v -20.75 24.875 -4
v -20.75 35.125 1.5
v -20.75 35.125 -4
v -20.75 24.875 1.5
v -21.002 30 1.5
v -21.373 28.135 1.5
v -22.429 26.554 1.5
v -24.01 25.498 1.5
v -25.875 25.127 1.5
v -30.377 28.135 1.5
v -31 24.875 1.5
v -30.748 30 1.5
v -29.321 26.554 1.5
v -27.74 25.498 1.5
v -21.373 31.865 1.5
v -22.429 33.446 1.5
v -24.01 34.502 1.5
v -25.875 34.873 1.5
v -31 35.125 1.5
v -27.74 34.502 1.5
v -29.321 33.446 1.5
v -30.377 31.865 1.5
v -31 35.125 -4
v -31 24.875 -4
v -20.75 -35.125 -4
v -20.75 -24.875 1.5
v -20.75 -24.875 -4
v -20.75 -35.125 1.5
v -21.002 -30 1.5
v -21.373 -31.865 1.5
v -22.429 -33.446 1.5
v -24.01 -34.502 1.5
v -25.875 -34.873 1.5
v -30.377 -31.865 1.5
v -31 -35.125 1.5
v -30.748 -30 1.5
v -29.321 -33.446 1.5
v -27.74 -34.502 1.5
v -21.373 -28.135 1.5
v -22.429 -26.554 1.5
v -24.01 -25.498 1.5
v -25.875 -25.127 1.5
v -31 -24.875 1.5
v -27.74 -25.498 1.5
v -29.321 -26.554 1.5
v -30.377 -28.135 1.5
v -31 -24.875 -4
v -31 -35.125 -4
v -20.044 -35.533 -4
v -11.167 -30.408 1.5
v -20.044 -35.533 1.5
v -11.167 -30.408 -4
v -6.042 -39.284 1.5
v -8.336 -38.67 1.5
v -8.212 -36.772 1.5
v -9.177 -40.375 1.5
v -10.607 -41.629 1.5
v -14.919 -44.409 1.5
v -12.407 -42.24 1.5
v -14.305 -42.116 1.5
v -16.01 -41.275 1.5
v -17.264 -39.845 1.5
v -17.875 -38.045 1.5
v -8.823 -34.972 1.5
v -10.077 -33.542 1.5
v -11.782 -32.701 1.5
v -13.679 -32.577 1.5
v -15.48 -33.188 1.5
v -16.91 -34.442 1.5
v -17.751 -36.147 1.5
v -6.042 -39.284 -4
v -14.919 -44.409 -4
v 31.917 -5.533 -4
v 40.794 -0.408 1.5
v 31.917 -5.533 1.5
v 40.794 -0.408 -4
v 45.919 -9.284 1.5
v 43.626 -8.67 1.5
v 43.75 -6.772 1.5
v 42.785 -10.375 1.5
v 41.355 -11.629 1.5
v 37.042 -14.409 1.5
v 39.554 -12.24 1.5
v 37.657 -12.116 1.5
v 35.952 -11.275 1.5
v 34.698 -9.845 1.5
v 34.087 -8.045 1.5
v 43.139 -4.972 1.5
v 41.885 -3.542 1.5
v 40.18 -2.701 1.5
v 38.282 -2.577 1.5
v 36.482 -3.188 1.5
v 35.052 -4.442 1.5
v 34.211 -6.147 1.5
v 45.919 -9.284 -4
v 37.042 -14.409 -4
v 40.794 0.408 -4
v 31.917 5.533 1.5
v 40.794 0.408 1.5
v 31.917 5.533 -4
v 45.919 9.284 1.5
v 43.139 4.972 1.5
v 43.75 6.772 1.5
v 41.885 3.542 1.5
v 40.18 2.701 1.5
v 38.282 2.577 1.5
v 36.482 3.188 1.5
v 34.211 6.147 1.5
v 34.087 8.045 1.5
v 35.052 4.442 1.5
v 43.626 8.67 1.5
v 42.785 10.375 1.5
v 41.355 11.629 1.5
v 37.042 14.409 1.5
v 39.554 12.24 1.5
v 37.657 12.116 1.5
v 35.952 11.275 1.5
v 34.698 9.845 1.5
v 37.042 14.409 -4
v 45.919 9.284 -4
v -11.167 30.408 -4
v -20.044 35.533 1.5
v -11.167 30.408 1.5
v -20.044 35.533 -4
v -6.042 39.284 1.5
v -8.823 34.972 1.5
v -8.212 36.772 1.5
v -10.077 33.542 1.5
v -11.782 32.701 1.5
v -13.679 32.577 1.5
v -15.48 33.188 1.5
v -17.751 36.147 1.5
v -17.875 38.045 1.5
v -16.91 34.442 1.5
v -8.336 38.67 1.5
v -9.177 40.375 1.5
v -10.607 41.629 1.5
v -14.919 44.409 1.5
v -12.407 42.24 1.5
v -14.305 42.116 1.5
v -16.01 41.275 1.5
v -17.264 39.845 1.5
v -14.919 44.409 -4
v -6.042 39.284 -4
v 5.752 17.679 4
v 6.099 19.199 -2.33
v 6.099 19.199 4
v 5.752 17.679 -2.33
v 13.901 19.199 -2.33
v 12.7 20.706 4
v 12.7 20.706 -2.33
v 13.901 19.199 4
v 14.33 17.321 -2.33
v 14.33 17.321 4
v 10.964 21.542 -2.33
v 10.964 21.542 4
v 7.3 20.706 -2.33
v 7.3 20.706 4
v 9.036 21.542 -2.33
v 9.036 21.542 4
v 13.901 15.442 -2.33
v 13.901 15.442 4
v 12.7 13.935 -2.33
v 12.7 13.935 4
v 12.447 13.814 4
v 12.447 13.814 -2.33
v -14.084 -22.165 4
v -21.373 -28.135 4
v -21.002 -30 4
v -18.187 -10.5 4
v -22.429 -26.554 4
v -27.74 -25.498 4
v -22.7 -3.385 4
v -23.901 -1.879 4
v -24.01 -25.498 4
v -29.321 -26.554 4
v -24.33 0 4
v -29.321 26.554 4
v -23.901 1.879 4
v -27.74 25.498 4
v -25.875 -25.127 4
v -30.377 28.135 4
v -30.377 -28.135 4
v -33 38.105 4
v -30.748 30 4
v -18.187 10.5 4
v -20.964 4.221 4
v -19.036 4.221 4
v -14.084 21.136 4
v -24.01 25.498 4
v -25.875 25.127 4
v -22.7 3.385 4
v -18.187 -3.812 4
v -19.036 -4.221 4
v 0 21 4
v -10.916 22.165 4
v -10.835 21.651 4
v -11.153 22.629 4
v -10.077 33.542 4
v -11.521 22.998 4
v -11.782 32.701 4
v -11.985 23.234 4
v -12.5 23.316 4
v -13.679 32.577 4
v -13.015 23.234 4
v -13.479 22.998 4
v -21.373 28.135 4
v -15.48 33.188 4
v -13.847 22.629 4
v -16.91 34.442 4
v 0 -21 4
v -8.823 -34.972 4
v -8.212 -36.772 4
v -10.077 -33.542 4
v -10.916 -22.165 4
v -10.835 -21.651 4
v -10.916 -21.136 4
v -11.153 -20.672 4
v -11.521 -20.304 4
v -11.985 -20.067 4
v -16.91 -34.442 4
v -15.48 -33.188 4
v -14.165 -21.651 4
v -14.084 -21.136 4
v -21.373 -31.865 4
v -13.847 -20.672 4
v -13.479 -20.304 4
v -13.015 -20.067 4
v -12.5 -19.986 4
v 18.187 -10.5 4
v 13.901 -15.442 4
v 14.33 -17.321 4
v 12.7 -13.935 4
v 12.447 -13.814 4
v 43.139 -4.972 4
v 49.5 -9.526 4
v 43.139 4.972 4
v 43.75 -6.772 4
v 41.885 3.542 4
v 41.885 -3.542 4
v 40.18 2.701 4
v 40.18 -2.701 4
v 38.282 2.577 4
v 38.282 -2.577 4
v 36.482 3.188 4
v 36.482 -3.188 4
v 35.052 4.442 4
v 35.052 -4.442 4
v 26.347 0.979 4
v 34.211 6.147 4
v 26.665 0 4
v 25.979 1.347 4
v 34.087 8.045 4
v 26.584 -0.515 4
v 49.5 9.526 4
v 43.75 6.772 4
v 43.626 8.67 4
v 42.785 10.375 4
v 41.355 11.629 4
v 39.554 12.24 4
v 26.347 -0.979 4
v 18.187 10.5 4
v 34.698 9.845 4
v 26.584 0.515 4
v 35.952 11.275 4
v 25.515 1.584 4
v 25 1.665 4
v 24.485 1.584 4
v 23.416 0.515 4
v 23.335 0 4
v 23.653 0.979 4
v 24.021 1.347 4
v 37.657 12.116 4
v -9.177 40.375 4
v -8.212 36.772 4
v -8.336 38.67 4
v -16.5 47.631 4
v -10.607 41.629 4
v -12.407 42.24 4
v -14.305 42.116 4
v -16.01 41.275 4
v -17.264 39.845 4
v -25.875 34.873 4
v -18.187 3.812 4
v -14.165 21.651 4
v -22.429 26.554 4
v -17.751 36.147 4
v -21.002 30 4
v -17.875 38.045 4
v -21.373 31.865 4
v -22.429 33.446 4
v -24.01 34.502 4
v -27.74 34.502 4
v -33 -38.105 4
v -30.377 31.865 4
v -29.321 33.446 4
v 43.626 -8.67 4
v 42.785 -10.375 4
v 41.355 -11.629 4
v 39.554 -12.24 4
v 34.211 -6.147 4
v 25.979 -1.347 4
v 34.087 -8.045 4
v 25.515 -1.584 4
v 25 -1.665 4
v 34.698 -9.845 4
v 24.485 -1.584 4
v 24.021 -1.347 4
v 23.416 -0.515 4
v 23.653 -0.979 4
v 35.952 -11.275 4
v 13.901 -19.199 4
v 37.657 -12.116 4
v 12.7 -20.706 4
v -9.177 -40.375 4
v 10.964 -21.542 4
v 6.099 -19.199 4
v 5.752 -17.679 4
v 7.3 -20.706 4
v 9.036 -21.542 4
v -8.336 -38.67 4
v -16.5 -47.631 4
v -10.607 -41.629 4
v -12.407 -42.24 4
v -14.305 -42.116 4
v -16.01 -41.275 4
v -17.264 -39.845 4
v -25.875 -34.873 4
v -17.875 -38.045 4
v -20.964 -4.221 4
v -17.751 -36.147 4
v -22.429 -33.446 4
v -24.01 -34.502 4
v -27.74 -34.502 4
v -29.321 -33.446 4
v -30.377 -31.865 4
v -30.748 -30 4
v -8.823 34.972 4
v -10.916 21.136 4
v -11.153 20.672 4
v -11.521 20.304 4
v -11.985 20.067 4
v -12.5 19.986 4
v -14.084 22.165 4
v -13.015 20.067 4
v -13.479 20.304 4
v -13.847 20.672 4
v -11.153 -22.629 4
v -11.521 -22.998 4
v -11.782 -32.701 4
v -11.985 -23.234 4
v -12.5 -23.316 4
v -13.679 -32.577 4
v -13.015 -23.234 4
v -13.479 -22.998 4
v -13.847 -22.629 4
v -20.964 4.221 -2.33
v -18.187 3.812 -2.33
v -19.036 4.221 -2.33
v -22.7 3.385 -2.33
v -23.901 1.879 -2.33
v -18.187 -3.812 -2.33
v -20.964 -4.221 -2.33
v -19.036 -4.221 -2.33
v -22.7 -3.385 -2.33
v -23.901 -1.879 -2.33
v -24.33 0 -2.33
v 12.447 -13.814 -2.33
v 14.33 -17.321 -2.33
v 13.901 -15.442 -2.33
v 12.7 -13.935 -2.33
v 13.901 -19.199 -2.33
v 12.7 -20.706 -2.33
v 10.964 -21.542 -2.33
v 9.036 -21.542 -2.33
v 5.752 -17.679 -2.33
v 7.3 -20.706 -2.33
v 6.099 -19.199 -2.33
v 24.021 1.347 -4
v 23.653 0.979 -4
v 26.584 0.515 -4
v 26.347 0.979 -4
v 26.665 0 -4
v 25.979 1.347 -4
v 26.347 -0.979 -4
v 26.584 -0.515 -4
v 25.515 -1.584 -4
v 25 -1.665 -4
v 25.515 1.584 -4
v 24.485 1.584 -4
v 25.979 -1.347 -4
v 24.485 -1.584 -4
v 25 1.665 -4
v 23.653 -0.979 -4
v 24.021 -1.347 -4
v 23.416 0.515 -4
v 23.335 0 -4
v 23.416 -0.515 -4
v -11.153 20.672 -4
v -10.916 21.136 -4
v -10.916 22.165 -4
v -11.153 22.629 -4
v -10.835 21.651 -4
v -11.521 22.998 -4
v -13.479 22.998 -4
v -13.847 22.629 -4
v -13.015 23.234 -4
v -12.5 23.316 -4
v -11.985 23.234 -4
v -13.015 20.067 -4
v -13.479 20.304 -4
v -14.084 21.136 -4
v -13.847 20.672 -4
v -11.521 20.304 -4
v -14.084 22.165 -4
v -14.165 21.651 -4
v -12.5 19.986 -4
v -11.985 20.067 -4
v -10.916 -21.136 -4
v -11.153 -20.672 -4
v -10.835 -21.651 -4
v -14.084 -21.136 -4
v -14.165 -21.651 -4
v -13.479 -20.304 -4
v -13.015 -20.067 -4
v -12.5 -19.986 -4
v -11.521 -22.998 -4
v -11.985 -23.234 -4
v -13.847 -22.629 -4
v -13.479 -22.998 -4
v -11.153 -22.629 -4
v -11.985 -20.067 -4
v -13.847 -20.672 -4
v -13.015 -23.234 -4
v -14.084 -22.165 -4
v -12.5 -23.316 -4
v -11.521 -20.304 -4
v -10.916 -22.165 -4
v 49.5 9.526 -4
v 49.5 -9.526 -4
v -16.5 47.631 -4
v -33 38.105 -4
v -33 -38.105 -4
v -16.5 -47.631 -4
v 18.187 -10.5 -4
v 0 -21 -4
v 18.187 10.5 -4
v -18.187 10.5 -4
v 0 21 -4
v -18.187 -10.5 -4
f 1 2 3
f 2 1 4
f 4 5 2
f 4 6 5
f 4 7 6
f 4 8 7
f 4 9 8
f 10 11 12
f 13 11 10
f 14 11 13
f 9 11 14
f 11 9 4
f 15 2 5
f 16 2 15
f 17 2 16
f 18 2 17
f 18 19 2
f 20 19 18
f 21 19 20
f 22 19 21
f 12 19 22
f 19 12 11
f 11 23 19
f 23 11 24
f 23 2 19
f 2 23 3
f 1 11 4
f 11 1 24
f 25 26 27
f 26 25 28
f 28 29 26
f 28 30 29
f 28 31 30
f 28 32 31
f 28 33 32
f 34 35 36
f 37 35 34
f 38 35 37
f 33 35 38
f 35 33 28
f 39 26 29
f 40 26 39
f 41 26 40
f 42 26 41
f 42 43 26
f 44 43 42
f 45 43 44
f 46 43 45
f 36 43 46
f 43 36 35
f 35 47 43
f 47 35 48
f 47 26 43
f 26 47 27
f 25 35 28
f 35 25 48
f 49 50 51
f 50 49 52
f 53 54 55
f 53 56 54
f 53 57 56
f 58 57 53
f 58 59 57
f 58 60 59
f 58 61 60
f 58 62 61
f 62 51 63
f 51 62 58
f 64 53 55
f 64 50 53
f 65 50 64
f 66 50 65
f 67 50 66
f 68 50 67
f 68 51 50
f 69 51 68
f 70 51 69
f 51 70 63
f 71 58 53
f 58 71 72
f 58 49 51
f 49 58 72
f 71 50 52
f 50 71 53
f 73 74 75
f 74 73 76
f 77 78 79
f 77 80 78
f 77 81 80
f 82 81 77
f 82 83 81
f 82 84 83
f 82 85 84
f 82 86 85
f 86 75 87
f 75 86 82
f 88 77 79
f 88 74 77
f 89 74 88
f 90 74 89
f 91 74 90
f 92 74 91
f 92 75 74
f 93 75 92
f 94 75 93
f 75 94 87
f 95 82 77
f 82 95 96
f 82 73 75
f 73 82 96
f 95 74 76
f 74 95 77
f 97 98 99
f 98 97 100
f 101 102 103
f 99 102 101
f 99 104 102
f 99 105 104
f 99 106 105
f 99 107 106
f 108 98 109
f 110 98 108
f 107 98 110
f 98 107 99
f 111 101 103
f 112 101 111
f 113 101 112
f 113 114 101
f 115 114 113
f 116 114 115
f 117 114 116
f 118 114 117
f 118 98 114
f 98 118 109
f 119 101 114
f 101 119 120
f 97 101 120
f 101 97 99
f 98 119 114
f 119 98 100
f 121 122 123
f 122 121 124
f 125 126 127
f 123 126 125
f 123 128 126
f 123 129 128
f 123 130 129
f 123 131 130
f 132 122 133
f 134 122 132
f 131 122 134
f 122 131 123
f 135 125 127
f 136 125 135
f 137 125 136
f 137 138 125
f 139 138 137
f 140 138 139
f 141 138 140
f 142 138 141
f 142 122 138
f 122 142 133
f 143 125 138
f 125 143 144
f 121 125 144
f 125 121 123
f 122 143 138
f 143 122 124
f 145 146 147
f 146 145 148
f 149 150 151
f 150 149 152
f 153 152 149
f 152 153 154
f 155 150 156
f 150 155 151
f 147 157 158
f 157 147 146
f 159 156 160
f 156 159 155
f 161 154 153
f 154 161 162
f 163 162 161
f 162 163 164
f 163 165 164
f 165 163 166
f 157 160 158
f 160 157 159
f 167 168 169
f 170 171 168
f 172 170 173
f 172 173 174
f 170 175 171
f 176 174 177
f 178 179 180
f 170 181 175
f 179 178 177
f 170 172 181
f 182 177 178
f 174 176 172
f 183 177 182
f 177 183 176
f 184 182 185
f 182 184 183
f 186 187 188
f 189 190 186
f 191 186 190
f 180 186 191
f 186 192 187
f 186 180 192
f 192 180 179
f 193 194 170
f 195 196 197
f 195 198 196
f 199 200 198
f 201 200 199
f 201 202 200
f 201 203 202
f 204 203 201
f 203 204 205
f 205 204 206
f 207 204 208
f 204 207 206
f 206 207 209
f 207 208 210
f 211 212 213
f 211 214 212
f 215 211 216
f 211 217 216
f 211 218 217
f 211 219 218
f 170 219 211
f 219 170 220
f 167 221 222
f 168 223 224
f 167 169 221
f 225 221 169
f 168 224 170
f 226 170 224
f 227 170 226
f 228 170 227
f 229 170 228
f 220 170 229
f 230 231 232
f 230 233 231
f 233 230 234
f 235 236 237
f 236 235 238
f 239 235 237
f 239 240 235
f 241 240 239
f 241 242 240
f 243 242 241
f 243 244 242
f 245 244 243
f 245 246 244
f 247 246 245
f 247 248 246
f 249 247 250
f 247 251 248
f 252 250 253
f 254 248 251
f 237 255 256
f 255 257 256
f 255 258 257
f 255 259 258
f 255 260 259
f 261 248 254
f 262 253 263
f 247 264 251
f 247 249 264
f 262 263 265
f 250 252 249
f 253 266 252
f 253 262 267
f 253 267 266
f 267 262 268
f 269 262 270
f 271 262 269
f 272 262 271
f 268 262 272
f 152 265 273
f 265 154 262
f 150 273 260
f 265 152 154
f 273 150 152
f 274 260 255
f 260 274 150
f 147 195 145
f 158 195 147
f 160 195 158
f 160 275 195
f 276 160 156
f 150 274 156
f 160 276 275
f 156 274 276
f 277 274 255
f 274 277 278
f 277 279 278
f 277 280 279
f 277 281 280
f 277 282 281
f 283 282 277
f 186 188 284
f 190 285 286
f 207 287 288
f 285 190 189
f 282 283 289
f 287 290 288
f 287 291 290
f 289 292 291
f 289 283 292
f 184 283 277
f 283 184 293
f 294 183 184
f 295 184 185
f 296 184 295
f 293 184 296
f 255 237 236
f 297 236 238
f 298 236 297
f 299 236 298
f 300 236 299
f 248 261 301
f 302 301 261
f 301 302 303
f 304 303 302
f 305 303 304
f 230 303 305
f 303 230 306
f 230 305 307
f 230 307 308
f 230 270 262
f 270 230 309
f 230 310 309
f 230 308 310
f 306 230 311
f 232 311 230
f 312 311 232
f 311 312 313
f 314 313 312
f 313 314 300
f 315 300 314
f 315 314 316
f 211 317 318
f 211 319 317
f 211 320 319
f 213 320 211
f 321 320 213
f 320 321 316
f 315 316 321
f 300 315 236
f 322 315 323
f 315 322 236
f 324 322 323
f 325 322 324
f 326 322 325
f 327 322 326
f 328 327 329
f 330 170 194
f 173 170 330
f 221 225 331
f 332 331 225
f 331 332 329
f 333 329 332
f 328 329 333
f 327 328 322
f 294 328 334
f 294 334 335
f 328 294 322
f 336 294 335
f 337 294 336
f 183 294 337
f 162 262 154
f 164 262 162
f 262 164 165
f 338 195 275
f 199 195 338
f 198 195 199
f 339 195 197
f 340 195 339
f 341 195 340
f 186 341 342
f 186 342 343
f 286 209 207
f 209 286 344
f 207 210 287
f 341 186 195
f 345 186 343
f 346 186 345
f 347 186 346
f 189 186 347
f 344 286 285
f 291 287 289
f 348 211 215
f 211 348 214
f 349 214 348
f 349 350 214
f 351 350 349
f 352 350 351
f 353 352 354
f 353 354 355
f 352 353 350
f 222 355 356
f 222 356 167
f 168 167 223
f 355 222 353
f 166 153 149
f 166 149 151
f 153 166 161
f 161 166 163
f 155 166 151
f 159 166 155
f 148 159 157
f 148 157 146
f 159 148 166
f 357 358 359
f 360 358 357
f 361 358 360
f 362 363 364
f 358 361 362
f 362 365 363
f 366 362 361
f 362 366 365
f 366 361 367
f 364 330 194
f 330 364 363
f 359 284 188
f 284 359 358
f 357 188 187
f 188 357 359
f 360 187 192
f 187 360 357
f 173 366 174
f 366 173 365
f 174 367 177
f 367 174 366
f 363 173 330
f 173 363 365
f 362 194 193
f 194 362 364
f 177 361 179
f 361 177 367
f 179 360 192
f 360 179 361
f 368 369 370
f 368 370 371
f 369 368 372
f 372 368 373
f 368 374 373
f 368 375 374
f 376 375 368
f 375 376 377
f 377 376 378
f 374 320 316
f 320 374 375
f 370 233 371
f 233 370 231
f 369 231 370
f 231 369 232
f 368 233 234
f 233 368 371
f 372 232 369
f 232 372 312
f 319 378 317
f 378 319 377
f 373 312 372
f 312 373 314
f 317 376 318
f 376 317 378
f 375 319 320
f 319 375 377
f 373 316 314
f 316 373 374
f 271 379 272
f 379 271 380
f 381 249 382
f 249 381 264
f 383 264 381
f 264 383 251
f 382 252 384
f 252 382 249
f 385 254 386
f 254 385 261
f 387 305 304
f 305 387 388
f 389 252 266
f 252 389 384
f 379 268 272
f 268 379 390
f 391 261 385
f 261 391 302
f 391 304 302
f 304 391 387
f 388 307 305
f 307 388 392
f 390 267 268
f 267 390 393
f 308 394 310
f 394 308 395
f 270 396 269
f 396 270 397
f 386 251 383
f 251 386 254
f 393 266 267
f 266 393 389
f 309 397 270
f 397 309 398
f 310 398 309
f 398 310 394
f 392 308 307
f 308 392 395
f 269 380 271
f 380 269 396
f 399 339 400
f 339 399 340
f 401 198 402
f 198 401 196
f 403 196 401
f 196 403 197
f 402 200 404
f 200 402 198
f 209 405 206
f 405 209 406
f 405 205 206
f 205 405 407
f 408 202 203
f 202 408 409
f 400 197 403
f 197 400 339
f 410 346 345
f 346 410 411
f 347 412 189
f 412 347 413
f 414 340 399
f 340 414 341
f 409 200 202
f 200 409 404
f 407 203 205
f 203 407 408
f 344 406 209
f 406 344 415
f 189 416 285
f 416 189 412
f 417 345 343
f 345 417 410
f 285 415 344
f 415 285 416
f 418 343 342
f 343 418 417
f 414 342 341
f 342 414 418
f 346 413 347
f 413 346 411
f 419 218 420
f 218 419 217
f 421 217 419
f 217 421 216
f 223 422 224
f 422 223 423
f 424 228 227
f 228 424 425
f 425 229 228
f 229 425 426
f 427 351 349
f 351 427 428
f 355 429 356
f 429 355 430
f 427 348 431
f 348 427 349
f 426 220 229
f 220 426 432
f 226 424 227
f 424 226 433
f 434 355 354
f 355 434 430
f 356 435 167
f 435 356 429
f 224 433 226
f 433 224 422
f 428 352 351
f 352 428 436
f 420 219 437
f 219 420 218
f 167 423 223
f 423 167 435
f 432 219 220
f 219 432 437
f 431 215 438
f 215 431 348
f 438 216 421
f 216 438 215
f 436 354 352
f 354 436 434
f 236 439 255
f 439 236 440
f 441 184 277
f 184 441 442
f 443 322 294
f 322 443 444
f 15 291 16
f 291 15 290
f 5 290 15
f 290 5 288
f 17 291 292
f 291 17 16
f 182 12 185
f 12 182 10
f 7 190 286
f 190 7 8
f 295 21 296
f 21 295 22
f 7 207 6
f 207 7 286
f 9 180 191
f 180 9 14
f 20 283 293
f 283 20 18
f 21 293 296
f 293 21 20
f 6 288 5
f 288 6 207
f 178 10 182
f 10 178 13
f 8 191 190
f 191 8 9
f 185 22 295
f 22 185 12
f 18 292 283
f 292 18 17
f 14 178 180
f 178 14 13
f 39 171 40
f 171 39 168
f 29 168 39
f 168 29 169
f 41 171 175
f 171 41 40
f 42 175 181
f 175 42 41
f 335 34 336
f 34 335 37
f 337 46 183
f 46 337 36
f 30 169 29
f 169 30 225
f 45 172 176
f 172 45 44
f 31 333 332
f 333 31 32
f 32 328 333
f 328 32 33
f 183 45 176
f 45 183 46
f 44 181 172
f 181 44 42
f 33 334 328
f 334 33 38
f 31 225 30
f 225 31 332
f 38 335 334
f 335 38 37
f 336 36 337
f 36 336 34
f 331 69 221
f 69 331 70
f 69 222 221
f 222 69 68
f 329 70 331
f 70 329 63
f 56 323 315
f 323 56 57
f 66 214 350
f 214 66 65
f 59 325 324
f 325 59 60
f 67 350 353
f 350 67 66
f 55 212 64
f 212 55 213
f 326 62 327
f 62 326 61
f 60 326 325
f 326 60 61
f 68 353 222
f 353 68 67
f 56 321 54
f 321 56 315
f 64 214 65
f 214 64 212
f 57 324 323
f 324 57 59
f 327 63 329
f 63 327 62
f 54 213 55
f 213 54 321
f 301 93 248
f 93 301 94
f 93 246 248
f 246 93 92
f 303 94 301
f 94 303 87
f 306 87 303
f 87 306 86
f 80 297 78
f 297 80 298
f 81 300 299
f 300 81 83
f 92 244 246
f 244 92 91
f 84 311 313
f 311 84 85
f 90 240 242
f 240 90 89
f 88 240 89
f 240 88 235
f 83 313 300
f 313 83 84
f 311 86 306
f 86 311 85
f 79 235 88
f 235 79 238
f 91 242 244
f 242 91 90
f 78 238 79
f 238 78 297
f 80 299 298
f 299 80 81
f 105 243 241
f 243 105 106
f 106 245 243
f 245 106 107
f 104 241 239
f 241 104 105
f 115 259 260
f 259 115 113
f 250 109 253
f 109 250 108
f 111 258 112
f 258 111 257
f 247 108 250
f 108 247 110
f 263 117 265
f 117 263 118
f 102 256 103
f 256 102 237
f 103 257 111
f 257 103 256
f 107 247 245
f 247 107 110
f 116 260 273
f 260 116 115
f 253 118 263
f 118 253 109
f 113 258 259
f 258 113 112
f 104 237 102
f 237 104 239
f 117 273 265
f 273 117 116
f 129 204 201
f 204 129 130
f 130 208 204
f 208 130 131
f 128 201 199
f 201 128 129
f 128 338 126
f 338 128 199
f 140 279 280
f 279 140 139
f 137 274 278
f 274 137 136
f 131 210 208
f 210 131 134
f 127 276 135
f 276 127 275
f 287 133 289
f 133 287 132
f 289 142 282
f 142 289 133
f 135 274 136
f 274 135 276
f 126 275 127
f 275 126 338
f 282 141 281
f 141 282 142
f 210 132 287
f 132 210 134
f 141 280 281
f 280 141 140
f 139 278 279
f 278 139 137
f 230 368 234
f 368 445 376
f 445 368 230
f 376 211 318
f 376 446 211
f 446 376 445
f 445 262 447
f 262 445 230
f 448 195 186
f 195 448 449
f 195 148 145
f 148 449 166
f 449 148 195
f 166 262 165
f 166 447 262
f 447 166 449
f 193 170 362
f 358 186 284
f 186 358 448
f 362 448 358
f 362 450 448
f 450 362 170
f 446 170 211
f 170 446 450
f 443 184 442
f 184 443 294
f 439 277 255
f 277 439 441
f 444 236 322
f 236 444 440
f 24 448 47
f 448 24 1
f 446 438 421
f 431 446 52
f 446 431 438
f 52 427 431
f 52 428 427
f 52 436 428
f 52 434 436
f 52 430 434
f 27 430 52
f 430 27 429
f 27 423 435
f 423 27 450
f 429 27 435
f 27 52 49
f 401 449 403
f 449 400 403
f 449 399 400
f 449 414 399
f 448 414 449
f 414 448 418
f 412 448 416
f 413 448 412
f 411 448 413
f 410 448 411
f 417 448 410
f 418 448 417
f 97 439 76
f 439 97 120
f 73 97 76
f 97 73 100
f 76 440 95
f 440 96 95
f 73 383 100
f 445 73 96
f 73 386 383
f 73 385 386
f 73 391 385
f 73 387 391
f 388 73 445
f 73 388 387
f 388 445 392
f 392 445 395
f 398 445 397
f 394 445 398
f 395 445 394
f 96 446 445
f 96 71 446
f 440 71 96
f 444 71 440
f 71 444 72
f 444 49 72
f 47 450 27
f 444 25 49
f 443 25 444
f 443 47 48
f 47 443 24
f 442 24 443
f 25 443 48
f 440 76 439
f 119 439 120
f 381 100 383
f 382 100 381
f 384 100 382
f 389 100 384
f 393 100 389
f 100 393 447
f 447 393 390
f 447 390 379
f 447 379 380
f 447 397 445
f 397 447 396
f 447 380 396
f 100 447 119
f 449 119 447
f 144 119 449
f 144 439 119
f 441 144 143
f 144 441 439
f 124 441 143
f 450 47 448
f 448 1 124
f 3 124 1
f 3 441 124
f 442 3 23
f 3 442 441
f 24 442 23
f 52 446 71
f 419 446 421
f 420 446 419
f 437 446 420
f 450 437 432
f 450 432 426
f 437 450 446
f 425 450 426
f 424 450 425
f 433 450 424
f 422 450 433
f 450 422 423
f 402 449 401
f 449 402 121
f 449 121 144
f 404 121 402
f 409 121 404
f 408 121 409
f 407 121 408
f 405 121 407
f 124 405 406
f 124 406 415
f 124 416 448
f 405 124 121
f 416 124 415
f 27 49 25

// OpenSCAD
// file: variables.scad
// Pinya3 3D Food Printer
// file: variables.scad 
// author: Luis Rodriguez
// version: 0.1
// w3b: 3digitalcooks.com 

// Variables for all the project
// just numbers??
alpha = 0.7;

// FRAME 
frame_alpha = alpha;
frame_profile_width = 20;

frame_height = 370;
frame_width = 250;  // 250mm -> 7capsules~de 8cm
frame_lenght = 200;

// PRINTING AREA
// from: https://www.marginallyclever.com/other/samples/fk-ik-test.html
// Base radius (f) = 80mm
// End Effector radius (e) = 30mm
// Bice length (rf) = 200mm
// Forearm length = 260mm
// PA = 260 x 260 x 260
// X=-128.225 to 128.225 mm 
// Y=-128.225 to 128.225 mm
// Z=-387.23 to -130.781 mm
printing_area_alpha = 0.2;
printing_area_x = 128*2;//195*2;
printing_area_y = 128*2;//195*2;
printing_area_distance_from_motors_base = 130;//151
printing_area_z_max = 387;
printing_area_z = printing_area_z_max - printing_area_distance_from_motors_base;//540-151;
echo("printing z =",printing_area_z);
printing_area_x_displacement = frame_width/2 + printing_area_x/2;

// FOREARM 
forearm_alpha = alpha;
forearm_length = 200;
forearm_rad = 4;
forearm_motors_joint_rad = 25;
forearm_ball_diameter = 12;

// MOTORS BASE
motors_base_alpha = alpha;
motors_base_thickness = 6;
motors_base_rad = forearm_motors_joint_rad;

// DELTA BEAM
delta_beam_alpha = alpha;
delta_beam_length = printing_area_x_displacement 
                    + forearm_motors_joint_rad 
                    + frame_width/2;
echo("Delta beam lenght = ", delta_beam_length);
delta_beam_profile_width = frame_profile_width*3; //60cm
delta_beam_under_frame = 0; // 1 = Beam under frame or 0 = Beam on frame
delta_beam_bolt_rad = 4;
delta_beam_distance_btw_slots = 20;


// CAROUSEL
carousel_alpha = 0.3;
carousel_number_of_tools = 11;
carousel_offset_rotation = 0; // in degrees
carousel_rad = frame_width-20;//160;
carousel_tool_height = 180;
carousel_tool_rad = 40;

// GEARED STEPPER
stepper_shaft_diameter = 8;

// MOTOR BICEP JOINT
motor_bicep_joint_shaft_holder_diameter = 21;
motor_bicep_joint_shaft_holder_thickness = 12;

motor_bicep_joint_bicep_holder_width = motor_bicep_joint_shaft_holder_thickness;
motor_bicep_joint_bicep_holder_length = 20 + motor_bicep_joint_shaft_holder_diameter/2;

motor_bicep_joint_bicep_insert_lenght = 20;

motor_bicep_joint_shaft_bolt_lenght = 12;
motor_bicep_joint_shaft_bolt_diameter = 3.25;

motor_bicep_joint_bicep_bolt_diameter = motor_bicep_joint_shaft_bolt_diameter;
motor_bicep_joint_bicep_bolt_lenght = 30;

motor_bicep_joint_shaft_nut_thickness = 3;
motor_bicep_joint_shaft_nut_width = 6.2;
motor_bicep_joint_shaft_nut_hole_height = 30;
motor_bicep_joint_shaft_nut_displacement = stepper_shaft_diameter/3 + 
            (motor_bicep_joint_shaft_holder_diameter/2 - stepper_shaft_diameter/2)/2;
motor_bicep_joint_bicep_nut_diameter = 6.5;
motor_bicep_joint_bicep_nut_thickness = motor_bicep_joint_shaft_nut_thickness;

motor_bicep_joint_shaft_flat_displecement = -4.6;
// BICEP
bicep_diameter = 8;

// MAGNET
magnet_clearance = 0.25;
magnet_cube_side = magnet_clearance + 10;

// BICEP FOREARM JOINT
bfj_distance_btw_forearms = 60;
bfj_width = 80;
bfj_thickness = 20;
bfj_forearms_joint_ball_sliding_height = 2.5;
bfj_height = magnet_cube_side/2 + bfj_forearms_joint_ball_sliding_height;
bfj_screw_diameter = 6;

// bfj_ball_sliding_rad calculation
R = forearm_ball_diameter/2;
r = bfj_forearms_joint_ball_sliding_height;
r_prima = R - r;
echo("r_prima", r_prima);
cosx = r_prima/R;
x = acos(cosx);
echo("x", x);
bfj_ball_sliding_rad = R*sin(x);
echo(bfj_ball_sliding_rad);
// main file
// Pinya3 3D Food Printer
// file: end_effector.scad 
// author: Luis Rodriguez
// version: 0.1
// w3b: 3digitalcooks.com

include <variables.scad>

ef_rad =  66;
ef_distance_btw_forearms = bfj_distance_btw_forearms;
ef_side_width = bfj_distance_btw_forearms + 20;
ef_magnet_hole_edge_offset = magnet_cube_side/2 + 2;

ef_blocking_hole_diameter = 3.33;
ef_blocking_hole_pos_diameter = 25;

ef_cutted_corners_pos_diameter = 35;

ef_tool_ole_rad = 21;

print_offset = 0.33;

magnet_rad = 8/2 + print_offset;
magnet_position_rad = 20;
magnet_height = 6 + print_offset;

ef_ball_sliding_magnet_clearance = bfj_forearms_joint_ball_sliding_height;
ef_ball_sliding_rad = bfj_ball_sliding_rad;

ef_thickness = 5.5 + ef_ball_sliding_magnet_clearance;
echo(ef_thickness);

end_effector();

module end_effector(){
  difference(){
    union(){ // Add
      ef_body();
    }
    union(){ // Substract
      ef_magnet_holes_sides();
      ef_tool_magnet_holes();
      ef_tool_blocking_holes();
      ef_tool_hole();
      ef_cutted_corners();
      #ef_sliding_ball_joints_holes();
    }
  }
}

// ADD
module ef_body() {
  cylinder(h = ef_thickness, r = ef_rad, center=true, $fn = 3);
}

// SUBSTRACT

module ef_magnet_holes_sides() {
  translate([0, 0, 
             -(magnet_cube_side - ef_thickness)/2 - ef_ball_sliding_magnet_clearance])
  for (i = [0,120,240]) {
    rotate([0, 0, i])
    ef_magnet_hole_side();
  }
}

module ef_magnet_hole_side() {
  for (i = [1,-1]) {
    translate([-ef_rad*sin(30)+ ef_magnet_hole_edge_offset
      , i*ef_distance_btw_forearms/2, 0])
      cube(magnet_cube_side, true);
  }
}

module ef_tool_simulation() {
  cylinder(h = 40, r = 25, center=true);
}

module ef_tool_hole(){
  // Freestyling "30"
  rotate([0, 0, 30])  
  cylinder(r=ef_tool_ole_rad, h=ef_thickness*5, $fn=6, center=true);
}

module ef_tool_magnet_holes(){
  for(x=[ 60,180, 300]){
    translate([magnet_position_rad*cos(x), 
               magnet_position_rad*sin(x), 
               ef_thickness/2 - magnet_height/2]) {
      cylinder(r=magnet_rad, h=magnet_height, center=true);
    }
  } 
}

module ef_tool_blocking_holes(){
  for(x=[ 0,120, 240]){
    translate([ef_blocking_hole_pos_diameter*cos(x), 
               ef_blocking_hole_pos_diameter*sin(x), 
               ef_thickness/2 - magnet_height/2]) {
      cylinder(r=ef_blocking_hole_diameter/2, h=magnet_height*2, $fn=20,center=true);
    }
  } 
}

module ef_cutted_corners(rotation = 0){
  for(x=[ 0,120, 240]){
    // Deleting unwanted parts from orignal body
    rotate([0, 0, x]) {
      translate([ef_rad, 0, 0]) {
        cube(size=[ef_rad/2, ef_rad, ef_thickness*2], center=true);
      }
    }
  }
}

module ef_sliding_ball_joints_holes() {
  translate([0, 0, 
             ef_thickness/2 - ef_ball_sliding_magnet_clearance/2])
  for (i = [0,120,240]) {
    rotate([0, 0, i])
    for (i = [1,-1]) {
      translate([-ef_rad*sin(30)+ ef_magnet_hole_edge_offset
        , i*ef_distance_btw_forearms/2, 0])
        cylinder( h = ef_ball_sliding_magnet_clearance, r = 
          ef_ball_sliding_rad, center=true);
    }
  }
}
